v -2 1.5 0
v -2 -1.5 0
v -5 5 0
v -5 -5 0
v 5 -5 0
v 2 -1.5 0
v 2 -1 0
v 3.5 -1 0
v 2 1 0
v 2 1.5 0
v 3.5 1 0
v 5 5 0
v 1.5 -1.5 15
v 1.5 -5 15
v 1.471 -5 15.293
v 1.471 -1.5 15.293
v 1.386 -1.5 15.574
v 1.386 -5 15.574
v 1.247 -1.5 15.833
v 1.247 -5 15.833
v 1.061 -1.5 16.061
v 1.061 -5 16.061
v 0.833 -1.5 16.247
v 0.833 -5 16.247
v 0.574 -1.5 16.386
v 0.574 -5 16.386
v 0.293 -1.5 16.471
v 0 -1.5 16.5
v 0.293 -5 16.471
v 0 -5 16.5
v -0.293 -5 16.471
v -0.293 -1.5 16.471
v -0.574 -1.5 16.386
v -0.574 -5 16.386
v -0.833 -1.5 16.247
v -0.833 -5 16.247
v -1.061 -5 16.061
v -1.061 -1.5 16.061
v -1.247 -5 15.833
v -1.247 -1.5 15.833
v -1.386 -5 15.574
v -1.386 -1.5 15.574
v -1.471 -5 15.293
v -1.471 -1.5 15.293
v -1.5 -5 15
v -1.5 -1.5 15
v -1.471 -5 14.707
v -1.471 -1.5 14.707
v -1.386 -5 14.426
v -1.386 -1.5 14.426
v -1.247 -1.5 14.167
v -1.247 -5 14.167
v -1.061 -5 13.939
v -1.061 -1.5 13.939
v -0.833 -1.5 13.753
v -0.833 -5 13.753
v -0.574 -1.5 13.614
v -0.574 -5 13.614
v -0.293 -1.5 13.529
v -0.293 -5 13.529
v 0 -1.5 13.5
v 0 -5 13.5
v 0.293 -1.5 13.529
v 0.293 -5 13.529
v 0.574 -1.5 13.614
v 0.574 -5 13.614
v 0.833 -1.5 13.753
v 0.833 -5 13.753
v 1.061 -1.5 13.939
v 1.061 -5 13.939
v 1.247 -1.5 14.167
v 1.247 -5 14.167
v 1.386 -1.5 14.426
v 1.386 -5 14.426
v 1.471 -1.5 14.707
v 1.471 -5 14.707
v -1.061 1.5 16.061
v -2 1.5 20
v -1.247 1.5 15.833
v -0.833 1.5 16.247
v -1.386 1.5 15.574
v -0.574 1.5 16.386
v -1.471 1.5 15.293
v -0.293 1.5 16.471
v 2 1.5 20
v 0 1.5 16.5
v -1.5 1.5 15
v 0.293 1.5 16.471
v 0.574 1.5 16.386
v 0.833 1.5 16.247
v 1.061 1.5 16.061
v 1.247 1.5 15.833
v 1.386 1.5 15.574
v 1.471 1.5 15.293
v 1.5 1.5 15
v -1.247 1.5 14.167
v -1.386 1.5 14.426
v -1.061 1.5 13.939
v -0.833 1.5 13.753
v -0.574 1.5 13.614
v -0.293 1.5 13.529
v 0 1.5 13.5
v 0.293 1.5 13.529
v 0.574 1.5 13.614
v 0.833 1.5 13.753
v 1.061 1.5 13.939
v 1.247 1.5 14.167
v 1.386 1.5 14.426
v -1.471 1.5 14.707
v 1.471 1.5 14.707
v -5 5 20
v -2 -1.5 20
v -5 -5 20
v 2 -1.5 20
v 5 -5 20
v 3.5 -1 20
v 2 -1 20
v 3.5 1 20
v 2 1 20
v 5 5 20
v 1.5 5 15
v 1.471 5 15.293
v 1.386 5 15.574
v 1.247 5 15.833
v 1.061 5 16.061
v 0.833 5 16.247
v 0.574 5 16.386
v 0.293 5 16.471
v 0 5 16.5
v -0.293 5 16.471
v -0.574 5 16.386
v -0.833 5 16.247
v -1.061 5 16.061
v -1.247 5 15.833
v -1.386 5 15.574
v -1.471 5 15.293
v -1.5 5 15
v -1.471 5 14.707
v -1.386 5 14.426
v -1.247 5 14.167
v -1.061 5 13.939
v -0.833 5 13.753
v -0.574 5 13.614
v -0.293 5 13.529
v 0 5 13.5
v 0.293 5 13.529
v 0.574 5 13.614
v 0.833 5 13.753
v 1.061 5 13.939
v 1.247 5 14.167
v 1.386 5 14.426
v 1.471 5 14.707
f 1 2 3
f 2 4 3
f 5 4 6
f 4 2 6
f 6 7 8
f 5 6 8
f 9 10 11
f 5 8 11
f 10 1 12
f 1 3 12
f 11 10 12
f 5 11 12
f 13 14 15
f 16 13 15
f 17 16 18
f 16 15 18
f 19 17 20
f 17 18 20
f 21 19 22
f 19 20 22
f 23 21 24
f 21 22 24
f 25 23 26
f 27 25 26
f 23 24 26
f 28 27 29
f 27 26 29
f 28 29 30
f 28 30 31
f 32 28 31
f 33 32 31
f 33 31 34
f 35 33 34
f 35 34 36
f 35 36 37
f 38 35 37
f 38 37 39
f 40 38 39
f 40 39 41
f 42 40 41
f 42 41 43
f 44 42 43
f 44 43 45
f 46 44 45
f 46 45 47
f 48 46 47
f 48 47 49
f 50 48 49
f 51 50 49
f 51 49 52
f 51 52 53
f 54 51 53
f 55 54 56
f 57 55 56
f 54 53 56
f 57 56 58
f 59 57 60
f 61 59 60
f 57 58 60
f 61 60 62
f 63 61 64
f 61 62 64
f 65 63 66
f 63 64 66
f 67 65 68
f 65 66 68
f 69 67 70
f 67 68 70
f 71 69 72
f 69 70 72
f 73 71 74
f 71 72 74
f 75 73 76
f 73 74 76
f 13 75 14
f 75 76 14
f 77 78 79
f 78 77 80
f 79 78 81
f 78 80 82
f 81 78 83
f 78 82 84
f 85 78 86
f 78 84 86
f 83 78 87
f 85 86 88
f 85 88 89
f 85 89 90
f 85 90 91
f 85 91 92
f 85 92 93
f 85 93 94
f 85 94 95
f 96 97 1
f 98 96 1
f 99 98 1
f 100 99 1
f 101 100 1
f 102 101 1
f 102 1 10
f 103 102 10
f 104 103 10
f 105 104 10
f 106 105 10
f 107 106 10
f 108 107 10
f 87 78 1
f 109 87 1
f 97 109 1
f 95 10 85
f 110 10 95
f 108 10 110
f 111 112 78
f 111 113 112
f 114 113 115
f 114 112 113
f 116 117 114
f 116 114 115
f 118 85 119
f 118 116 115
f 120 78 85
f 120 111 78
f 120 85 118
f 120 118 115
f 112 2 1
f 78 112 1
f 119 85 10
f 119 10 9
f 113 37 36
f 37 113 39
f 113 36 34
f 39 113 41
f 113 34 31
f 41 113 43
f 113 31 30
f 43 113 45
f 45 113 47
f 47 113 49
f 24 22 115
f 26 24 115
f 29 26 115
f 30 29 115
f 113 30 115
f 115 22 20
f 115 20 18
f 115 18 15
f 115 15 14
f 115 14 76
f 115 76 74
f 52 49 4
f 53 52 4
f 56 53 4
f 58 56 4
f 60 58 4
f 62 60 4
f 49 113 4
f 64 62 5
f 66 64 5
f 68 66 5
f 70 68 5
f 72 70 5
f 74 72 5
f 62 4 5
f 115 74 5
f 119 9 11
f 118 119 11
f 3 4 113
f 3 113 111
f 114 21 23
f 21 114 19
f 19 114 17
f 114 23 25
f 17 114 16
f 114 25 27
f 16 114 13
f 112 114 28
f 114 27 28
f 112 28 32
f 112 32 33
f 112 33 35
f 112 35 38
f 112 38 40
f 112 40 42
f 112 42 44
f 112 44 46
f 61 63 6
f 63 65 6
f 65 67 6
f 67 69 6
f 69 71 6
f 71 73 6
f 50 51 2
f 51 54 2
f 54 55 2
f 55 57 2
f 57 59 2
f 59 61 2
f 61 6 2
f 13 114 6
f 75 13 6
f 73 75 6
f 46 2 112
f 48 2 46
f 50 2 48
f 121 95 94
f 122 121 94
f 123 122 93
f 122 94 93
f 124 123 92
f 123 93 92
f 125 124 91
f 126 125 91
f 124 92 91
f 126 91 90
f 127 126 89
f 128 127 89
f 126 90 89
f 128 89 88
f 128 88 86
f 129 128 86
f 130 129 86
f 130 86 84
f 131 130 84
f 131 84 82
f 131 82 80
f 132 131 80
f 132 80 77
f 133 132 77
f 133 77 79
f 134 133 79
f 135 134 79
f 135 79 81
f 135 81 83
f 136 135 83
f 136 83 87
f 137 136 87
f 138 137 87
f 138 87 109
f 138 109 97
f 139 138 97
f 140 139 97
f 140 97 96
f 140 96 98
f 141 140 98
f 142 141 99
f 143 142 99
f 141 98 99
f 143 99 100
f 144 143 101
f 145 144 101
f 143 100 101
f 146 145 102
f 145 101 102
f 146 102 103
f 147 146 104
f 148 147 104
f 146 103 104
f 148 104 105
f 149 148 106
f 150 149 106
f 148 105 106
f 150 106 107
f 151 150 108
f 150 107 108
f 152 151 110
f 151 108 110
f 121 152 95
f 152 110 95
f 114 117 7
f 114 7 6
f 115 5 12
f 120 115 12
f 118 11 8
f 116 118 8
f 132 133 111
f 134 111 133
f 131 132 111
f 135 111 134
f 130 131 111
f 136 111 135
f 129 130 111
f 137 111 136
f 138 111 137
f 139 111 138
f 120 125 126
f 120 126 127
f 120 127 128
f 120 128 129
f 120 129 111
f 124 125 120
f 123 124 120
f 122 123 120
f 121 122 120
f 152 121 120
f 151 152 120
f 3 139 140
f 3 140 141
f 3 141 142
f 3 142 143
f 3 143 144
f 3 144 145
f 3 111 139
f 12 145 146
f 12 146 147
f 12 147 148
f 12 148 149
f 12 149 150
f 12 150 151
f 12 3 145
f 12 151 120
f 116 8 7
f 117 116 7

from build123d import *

# Parameters (mm, degrees)
SKETCH1_W           = 10
SKETCH1_H           = 10
BOSS_EXTRUDE1_DEPTH = 20
SKETCH2_R           = 1.5
CUT_EXTRUDE1_DEPTH  = 20


with BuildPart() as part:
    # Sketch1 → Boss-Extrude1 (new body)
    with BuildSketch(Plane.XY):
        Rectangle(SKETCH1_W, SKETCH1_H)
        Polygon((2, -1.5), (-2, -1.5), (-2, 1.5), (2, 1.5), (2, 1), (3.5, 1), (3.5, -1), (2, -1), align=None, mode=Mode.SUBTRACT)
    extrude(amount=BOSS_EXTRUDE1_DEPTH)

    # Sketch2 → Cut-Extrude1 (cut)
    with BuildSketch(Plane.XZ.offset(5)):
        with Locations((0, 15)):
            Circle(SKETCH2_R)
    extrude(amount=-CUT_EXTRUDE1_DEPTH, mode=Mode.SUBTRACT)


solid = part.part
